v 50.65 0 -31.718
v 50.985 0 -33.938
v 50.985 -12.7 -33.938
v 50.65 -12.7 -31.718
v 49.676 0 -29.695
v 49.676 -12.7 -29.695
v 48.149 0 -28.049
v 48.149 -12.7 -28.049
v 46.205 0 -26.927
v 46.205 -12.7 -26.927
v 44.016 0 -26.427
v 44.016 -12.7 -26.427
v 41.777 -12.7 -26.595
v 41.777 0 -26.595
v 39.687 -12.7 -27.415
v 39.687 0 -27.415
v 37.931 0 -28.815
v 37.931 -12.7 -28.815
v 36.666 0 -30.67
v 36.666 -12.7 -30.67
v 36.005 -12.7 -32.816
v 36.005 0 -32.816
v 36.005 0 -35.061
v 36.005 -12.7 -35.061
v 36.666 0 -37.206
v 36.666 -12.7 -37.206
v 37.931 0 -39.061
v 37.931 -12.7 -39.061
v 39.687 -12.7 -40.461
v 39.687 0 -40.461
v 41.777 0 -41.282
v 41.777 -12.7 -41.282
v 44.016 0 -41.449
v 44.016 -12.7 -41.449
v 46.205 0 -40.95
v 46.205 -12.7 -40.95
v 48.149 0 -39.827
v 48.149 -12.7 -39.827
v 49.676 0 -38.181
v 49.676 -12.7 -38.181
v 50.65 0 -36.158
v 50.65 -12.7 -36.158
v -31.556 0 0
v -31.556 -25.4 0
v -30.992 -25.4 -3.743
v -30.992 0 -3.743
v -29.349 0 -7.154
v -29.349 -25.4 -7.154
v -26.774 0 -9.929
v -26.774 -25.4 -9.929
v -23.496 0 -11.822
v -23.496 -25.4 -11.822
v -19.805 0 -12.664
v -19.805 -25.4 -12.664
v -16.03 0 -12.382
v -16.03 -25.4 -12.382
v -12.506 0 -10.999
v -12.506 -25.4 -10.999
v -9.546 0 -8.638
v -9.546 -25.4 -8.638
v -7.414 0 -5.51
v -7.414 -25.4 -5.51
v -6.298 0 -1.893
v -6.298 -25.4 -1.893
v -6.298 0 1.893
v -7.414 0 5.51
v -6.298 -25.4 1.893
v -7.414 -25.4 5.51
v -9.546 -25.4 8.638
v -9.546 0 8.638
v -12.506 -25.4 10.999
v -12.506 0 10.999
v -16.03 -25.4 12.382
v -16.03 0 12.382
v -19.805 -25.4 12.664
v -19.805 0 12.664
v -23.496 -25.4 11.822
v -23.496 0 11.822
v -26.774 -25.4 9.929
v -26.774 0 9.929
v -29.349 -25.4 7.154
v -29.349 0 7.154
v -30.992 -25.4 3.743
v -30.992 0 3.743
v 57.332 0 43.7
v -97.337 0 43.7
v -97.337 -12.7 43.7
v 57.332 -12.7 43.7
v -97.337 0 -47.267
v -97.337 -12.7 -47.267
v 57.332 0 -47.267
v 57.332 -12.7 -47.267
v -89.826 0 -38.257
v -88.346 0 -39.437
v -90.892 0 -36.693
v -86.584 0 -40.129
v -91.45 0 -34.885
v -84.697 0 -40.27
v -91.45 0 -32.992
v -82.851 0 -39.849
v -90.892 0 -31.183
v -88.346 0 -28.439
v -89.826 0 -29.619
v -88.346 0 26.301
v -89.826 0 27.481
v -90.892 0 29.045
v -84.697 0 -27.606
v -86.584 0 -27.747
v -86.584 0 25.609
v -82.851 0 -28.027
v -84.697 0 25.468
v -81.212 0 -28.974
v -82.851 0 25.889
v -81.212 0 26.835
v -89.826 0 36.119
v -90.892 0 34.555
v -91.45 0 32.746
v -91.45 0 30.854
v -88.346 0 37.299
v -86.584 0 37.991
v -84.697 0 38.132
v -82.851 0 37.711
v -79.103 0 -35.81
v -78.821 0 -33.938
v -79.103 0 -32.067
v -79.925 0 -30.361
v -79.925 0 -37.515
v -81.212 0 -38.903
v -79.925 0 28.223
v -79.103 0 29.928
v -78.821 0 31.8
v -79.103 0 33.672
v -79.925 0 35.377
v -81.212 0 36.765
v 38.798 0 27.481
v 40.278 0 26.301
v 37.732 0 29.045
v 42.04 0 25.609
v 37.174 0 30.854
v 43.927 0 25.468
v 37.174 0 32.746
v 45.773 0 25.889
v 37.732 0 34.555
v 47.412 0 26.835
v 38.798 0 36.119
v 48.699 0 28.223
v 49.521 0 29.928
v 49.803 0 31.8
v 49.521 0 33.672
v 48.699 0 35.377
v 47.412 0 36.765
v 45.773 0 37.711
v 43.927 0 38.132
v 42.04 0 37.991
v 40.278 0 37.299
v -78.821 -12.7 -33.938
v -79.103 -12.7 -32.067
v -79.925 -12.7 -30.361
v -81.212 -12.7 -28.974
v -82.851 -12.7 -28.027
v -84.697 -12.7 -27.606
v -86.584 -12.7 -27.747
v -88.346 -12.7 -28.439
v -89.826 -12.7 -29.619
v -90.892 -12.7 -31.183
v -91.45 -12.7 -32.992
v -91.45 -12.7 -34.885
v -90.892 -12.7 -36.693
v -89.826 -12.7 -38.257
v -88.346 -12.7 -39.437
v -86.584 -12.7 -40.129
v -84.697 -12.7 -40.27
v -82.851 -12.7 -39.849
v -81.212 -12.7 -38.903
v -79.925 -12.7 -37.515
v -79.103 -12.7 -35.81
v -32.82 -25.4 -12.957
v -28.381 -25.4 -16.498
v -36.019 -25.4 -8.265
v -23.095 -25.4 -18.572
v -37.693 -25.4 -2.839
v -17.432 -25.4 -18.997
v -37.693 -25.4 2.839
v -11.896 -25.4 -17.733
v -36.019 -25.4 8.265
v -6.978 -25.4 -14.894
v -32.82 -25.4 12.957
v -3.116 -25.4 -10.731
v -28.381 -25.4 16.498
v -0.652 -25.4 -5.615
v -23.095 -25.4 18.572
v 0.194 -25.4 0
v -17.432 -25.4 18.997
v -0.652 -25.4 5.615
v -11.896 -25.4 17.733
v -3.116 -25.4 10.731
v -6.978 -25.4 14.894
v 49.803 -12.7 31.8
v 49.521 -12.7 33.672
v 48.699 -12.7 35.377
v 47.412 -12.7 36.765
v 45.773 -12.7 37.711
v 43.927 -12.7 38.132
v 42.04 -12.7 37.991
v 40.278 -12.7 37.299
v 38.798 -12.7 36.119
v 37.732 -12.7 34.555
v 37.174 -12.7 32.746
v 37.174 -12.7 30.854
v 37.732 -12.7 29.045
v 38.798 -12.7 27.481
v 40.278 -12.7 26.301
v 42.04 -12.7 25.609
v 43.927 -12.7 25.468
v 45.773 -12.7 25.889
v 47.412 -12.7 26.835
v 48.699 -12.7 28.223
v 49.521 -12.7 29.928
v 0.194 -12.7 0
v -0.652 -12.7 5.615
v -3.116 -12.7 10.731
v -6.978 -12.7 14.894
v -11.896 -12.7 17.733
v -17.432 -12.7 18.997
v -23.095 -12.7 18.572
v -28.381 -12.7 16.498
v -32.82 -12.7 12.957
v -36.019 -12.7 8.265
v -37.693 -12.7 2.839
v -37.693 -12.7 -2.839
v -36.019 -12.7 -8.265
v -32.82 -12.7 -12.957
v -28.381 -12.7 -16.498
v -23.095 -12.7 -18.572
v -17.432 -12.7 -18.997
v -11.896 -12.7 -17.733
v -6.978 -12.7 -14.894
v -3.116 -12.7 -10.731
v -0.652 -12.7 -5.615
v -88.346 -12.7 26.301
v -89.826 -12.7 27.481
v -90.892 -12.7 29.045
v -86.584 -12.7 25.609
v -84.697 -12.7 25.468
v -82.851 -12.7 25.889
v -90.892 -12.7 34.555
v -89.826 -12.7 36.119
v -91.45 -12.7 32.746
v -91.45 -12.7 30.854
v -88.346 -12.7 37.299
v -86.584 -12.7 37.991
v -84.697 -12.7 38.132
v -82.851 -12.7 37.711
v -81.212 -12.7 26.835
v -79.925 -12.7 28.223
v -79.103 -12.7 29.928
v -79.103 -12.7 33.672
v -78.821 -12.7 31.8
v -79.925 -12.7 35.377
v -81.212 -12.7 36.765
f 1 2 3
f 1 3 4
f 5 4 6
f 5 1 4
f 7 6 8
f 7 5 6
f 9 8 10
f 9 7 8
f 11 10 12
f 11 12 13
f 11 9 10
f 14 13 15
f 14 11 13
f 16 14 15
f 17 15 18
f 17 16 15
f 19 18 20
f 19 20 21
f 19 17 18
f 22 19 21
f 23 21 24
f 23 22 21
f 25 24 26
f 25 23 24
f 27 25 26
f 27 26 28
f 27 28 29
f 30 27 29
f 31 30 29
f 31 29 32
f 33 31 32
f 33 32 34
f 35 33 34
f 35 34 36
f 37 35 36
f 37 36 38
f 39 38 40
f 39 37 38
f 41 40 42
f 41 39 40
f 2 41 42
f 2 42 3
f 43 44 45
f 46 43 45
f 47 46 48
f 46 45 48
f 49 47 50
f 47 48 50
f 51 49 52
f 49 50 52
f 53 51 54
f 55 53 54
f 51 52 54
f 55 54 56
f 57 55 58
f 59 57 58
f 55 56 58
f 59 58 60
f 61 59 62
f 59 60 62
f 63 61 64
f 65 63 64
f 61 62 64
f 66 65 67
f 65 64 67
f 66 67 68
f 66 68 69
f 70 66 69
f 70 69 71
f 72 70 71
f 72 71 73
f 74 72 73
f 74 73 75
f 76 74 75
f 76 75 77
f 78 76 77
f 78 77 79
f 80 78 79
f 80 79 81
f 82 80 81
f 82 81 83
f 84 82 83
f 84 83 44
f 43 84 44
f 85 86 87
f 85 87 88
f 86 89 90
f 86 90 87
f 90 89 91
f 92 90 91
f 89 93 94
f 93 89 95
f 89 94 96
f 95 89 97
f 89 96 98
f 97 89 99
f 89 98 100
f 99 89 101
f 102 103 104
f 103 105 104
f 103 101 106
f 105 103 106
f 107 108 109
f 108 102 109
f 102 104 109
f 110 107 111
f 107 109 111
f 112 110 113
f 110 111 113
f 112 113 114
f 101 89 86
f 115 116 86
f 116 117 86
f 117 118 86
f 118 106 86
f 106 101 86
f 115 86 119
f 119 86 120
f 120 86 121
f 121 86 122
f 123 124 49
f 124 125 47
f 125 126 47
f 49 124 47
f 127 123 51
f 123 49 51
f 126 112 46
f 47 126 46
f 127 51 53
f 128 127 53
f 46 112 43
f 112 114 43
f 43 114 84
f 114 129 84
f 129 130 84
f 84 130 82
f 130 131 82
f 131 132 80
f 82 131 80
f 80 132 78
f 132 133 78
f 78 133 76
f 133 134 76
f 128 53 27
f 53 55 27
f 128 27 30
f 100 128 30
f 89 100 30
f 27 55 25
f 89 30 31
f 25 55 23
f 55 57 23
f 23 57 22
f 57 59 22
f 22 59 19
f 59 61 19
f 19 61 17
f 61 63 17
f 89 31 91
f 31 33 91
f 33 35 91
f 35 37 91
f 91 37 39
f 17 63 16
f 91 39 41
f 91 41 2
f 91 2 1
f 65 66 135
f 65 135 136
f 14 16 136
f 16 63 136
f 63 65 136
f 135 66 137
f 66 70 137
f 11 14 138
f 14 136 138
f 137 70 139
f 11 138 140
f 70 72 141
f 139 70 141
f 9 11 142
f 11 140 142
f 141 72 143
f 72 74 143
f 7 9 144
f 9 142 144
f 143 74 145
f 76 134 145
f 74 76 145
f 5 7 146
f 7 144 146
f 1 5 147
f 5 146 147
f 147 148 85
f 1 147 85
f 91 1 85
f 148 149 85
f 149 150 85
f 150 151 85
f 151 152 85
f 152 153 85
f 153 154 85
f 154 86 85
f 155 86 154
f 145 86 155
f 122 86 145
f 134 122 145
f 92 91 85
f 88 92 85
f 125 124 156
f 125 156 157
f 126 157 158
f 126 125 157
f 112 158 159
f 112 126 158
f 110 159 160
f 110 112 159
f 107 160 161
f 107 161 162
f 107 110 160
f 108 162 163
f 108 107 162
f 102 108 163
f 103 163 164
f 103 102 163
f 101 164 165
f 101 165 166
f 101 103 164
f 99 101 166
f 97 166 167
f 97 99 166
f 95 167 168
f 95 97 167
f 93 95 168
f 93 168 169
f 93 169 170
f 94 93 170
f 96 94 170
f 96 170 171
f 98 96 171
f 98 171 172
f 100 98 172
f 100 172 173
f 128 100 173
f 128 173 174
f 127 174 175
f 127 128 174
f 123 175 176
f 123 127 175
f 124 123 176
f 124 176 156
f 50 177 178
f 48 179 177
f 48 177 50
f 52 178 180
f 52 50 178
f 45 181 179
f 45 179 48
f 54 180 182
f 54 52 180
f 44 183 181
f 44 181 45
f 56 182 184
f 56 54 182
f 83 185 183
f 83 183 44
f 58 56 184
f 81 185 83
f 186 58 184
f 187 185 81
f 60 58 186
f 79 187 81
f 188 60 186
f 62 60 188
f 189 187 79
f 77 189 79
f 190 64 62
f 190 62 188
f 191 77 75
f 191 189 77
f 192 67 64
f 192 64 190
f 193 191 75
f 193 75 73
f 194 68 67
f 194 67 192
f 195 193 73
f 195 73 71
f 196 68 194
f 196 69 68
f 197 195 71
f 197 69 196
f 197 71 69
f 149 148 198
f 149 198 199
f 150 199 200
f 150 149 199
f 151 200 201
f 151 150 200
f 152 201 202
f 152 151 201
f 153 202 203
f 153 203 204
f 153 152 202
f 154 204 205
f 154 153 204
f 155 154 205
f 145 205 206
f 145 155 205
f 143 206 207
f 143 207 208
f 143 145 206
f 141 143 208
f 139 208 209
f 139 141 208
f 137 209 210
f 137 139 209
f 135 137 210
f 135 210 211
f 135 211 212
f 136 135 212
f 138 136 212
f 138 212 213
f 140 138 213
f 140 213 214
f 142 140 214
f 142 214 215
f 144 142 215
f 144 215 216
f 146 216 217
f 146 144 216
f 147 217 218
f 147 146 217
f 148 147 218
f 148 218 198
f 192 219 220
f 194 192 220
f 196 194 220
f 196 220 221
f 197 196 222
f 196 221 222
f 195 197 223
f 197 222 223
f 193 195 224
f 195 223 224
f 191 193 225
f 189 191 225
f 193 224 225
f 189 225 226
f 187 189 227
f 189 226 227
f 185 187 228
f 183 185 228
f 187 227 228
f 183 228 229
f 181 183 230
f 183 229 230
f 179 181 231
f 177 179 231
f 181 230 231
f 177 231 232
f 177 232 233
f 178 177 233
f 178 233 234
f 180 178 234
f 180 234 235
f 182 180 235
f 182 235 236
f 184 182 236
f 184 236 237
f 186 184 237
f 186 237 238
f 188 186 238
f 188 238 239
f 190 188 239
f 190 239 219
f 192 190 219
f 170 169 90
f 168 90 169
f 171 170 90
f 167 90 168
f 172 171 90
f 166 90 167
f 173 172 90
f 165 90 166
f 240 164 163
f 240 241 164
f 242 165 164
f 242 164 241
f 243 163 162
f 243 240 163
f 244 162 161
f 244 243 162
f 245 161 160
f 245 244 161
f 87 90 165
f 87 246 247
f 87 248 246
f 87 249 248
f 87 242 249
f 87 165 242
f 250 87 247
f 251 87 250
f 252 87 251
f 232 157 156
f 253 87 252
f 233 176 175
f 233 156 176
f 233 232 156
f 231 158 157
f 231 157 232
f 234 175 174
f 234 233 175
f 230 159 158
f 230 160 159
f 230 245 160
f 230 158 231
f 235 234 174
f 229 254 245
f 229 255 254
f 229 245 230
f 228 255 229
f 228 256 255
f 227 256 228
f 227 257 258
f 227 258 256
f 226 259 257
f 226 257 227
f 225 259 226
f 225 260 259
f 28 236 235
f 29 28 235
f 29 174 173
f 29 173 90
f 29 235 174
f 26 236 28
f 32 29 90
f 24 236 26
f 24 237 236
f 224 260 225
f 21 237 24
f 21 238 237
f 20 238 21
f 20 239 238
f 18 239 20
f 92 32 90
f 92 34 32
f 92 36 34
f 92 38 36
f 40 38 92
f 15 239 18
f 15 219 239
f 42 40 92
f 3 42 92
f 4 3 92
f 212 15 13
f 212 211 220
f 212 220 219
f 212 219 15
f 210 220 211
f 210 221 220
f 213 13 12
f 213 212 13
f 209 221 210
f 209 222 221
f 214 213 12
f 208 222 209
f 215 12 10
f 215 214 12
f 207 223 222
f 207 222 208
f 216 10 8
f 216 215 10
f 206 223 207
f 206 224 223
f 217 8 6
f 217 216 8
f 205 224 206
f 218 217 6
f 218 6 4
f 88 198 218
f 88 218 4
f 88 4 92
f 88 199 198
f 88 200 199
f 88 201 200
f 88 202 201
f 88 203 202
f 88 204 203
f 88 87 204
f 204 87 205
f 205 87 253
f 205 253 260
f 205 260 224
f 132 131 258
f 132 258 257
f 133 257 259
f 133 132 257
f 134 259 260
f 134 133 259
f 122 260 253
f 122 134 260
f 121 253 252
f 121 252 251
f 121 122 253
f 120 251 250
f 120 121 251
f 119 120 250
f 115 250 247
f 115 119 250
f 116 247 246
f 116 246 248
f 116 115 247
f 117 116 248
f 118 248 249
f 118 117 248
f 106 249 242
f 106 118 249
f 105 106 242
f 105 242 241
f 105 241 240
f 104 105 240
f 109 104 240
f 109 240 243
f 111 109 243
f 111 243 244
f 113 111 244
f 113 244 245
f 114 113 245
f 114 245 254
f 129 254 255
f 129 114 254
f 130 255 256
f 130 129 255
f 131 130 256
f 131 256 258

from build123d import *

# Parameters (mm, degrees)
F0_R     = 19.05
F1_DEPTH = 25.4
F0_W     = 154.669017
F0_H     = 90.966787
F0_R_2   = 6.35
F0_R_3   = 7.532176
F2_DEPTH = 12.7
F3_D     = 25.4


with BuildPart() as f1:
    # F0 (on Front) → F1 (new body)
    with BuildSketch(Plane.XZ):
        with Locations((-18.855859, 0)):
            Circle(F0_R)
    extrude(amount=F1_DEPTH)

    # F0 (on Front) → F2 (join)
    with BuildSketch(Plane.XZ):
        with Locations((-20.002499, -1.783664)):
            Rectangle(F0_W, F0_H)
        with Locations((-85.171133, -33.938222)):
            Circle(F0_R_2, mode=Mode.SUBTRACT)
        with Locations((43.452755, -33.938222)):
            Circle(F0_R_3, mode=Mode.SUBTRACT)
        with Locations((-85.171133, 31.799983)):
            Circle(F0_R_2, mode=Mode.SUBTRACT)
        with Locations((-18.855859, 0)):
            Circle(F0_R, mode=Mode.SUBTRACT)
        with Locations((43.452755, 31.799983)):
            Circle(F0_R_2, mode=Mode.SUBTRACT)
    extrude(amount=F2_DEPTH)

    # F3 (through all)
    with Locations(Plane(origin=(0, 0, 0), x_dir=(1, 0, 0), z_dir=(0, 1, 0))):
        with Locations((-18.855859, 0)):
            Hole(F3_D / 2)


solid = f1.part
